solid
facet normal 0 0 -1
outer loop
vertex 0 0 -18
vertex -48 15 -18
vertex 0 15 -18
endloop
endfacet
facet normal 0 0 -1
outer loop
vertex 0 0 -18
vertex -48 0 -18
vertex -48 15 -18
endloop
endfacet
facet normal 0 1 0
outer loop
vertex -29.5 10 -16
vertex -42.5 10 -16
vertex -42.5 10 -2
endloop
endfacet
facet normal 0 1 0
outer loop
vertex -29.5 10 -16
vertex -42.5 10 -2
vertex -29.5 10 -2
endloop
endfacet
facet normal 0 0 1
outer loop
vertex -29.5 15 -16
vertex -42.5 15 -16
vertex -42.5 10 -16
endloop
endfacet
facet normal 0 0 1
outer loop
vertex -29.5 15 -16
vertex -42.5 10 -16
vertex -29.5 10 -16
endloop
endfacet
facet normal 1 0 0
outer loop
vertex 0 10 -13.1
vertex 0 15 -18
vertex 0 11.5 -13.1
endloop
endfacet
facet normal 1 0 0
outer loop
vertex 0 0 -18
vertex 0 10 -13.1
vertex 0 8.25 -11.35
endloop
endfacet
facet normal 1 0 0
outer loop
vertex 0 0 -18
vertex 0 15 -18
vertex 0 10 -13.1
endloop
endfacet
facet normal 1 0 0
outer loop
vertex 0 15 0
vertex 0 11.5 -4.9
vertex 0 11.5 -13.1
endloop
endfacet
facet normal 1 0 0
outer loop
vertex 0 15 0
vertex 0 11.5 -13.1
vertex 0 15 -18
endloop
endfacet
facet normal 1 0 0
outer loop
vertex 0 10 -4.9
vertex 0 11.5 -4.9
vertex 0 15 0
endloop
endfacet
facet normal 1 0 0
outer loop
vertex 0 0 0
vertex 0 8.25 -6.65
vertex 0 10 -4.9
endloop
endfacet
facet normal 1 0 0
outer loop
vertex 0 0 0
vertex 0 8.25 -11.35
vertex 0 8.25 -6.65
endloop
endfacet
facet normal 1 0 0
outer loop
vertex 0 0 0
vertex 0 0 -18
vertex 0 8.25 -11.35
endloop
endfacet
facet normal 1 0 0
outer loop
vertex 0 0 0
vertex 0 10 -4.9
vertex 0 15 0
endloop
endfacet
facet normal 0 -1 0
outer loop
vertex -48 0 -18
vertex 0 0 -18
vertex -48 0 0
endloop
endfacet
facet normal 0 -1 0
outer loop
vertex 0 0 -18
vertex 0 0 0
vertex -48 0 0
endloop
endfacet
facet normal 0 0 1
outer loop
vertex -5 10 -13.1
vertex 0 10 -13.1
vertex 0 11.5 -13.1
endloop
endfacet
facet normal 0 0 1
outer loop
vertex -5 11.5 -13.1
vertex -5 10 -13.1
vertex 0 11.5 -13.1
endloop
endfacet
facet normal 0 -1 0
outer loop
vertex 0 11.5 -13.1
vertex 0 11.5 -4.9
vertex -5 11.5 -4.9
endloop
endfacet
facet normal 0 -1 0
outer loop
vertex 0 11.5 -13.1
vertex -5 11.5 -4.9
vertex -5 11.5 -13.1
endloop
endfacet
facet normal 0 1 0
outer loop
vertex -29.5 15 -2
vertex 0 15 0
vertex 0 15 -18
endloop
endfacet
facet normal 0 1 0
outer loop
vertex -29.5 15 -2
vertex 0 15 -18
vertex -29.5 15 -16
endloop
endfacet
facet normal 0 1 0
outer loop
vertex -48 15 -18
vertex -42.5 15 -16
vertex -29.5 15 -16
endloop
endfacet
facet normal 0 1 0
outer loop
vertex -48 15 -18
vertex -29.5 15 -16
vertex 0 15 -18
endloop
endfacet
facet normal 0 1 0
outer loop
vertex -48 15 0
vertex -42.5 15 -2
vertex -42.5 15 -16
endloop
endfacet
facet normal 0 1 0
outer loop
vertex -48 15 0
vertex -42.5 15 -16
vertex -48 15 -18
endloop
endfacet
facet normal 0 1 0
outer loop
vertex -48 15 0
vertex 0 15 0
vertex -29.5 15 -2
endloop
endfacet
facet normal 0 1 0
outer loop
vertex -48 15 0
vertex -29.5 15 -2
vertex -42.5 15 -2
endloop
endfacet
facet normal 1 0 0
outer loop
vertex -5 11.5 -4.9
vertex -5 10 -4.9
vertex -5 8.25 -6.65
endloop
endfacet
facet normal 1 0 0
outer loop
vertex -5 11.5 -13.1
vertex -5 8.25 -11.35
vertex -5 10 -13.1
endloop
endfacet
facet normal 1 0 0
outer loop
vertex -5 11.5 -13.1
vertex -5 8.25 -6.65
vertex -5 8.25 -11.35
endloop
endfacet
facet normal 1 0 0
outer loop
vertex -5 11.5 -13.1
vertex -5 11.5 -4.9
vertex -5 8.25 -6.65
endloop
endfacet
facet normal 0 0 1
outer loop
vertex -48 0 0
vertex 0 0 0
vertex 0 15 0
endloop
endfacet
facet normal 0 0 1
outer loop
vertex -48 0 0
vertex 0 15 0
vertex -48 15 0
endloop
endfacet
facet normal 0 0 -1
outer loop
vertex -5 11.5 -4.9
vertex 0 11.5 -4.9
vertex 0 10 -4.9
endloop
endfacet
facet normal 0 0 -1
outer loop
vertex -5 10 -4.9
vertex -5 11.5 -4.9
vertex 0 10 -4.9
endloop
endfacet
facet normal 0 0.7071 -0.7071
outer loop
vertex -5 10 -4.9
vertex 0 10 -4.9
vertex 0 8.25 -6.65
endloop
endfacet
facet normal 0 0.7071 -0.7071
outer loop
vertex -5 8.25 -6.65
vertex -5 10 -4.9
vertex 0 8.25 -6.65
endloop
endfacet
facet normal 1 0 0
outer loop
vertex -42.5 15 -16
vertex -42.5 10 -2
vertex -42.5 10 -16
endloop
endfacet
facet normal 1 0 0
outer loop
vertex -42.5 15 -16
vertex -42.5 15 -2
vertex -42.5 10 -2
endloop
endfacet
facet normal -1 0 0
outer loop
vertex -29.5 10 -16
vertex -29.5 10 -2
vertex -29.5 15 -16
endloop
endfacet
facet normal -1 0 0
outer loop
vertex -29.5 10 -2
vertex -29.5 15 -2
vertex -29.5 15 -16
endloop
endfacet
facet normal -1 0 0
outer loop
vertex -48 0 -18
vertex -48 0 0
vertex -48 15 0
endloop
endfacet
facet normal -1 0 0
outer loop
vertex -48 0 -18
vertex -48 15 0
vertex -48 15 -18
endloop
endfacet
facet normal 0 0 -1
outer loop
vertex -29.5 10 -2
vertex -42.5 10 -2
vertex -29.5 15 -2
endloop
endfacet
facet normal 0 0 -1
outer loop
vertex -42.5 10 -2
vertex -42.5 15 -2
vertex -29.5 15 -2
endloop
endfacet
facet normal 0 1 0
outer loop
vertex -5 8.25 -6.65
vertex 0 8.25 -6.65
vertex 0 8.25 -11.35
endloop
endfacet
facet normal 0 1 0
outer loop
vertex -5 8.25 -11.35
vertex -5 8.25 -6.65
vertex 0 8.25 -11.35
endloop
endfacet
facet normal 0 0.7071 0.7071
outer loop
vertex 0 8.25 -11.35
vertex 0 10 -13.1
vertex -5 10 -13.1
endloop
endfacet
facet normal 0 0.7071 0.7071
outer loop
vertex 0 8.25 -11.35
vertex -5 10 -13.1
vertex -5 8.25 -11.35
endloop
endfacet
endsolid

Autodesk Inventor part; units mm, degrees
ref_plane "YZ Plane" through (0, 0, 0) normal (1, 0, 0) x (0, 1, 0)
ref_plane "XZ Plane" through (0, 0, 0) normal (0, 1, 0) x (-1, 0, 0)
ref_plane "XY Plane" through (0, 0, 0) normal (0, 0, 1) x (1, 0, 0)
sketch "Sketch1" plane through (0, 0, 0) normal (0, 1, 0) x (-1, 0, 0)
  line L0 (0, 0) -> (48, 0)
  line L1 (48, 0) -> (48, -18)
  line L2 (48, -18) -> (0, -18)
  line L3 (0, -18) -> (0, 0)
  dimension "d0" = 48
  dimension "d1" = 18
extrude "Extrusion1" add sketch "Sketch1" along normal blind 15
sketch "Sketch2" plane through (0, 15, 0) normal (0, 1, 0) x (1, 0, 0)
  line L0 (-48, 18) -> (-48, 0) projected
  line L1 (-48, 0) -> (-42.5, 0)
  line L2 (-48, 0) -> (0, 0) projected
  line L3 (-42.5, 0) -> (-42.5, 2)
  line L4 (-42.5, 2) -> (-29.5, 2)
  line L5 (-29.5, 2) -> (-29.5, 16)
  line L6 (-42.5, 2) -> (-42.5, 16)
  line L7 (-42.5, 16) -> (-29.5, 16)
  dimension "d4" = 5.5
  dimension "d5" = 2
  dimension "d6" = 13
  dimension "d7" = 14
extrude "Extrusion2" cut sketch "Sketch2" against normal blind 5
sketch "Sketch3" plane through (0, 0, 0) normal (1, 0, 0) x (0, 0, -1)
  line L0 (0, 0) -> (0, 15)
  line L1 (0, 15) -> (18, 15)
  line L2 (16, 15) -> (2, 15) projected
  line L3 (9, 15) -> (9, 11.5)
  line L4 (9, 11.5) -> (13.1, 11.5)
  line L5 (13.1, 11.5) -> (4.9, 11.5)
  line L6 (4.9, 11.5) -> (4.9, 8.25)
  line L7 (4.9, 8.25) -> (13.1, 8.25)
  line L8 (13.1, 8.25) -> (13.1, 11.5)
  line L9 (16, 10) -> (2, 10) projected
  line L10 (4.9, 10) -> (7.1782, 7.7218)
  line L11 (4.9, 10) -> (8.1218, 10) construction
  line L12 (13.1, 10) -> (10.403, 7.303)
  line L13 (13.1, 10) -> (16.9142, 10) construction
  point P0 (11.35, 8.25)
  point P1 (6.65, 8.25)
  dimension "d10" = 18
  dimension "d11" = 3.5
  dimension "d12" = 4.1
  dimension "d13" = 8.2
  dimension "d14" = 3.25
  dimension "d15" = 45
  dimension "d16" = 135
extrude "Extrusion3" cut sketch "Sketch3" against normal blind 5 contours L4 L8 L9 L6 L5 | L12 L7 L10 L9
properties part number "U2D2"
